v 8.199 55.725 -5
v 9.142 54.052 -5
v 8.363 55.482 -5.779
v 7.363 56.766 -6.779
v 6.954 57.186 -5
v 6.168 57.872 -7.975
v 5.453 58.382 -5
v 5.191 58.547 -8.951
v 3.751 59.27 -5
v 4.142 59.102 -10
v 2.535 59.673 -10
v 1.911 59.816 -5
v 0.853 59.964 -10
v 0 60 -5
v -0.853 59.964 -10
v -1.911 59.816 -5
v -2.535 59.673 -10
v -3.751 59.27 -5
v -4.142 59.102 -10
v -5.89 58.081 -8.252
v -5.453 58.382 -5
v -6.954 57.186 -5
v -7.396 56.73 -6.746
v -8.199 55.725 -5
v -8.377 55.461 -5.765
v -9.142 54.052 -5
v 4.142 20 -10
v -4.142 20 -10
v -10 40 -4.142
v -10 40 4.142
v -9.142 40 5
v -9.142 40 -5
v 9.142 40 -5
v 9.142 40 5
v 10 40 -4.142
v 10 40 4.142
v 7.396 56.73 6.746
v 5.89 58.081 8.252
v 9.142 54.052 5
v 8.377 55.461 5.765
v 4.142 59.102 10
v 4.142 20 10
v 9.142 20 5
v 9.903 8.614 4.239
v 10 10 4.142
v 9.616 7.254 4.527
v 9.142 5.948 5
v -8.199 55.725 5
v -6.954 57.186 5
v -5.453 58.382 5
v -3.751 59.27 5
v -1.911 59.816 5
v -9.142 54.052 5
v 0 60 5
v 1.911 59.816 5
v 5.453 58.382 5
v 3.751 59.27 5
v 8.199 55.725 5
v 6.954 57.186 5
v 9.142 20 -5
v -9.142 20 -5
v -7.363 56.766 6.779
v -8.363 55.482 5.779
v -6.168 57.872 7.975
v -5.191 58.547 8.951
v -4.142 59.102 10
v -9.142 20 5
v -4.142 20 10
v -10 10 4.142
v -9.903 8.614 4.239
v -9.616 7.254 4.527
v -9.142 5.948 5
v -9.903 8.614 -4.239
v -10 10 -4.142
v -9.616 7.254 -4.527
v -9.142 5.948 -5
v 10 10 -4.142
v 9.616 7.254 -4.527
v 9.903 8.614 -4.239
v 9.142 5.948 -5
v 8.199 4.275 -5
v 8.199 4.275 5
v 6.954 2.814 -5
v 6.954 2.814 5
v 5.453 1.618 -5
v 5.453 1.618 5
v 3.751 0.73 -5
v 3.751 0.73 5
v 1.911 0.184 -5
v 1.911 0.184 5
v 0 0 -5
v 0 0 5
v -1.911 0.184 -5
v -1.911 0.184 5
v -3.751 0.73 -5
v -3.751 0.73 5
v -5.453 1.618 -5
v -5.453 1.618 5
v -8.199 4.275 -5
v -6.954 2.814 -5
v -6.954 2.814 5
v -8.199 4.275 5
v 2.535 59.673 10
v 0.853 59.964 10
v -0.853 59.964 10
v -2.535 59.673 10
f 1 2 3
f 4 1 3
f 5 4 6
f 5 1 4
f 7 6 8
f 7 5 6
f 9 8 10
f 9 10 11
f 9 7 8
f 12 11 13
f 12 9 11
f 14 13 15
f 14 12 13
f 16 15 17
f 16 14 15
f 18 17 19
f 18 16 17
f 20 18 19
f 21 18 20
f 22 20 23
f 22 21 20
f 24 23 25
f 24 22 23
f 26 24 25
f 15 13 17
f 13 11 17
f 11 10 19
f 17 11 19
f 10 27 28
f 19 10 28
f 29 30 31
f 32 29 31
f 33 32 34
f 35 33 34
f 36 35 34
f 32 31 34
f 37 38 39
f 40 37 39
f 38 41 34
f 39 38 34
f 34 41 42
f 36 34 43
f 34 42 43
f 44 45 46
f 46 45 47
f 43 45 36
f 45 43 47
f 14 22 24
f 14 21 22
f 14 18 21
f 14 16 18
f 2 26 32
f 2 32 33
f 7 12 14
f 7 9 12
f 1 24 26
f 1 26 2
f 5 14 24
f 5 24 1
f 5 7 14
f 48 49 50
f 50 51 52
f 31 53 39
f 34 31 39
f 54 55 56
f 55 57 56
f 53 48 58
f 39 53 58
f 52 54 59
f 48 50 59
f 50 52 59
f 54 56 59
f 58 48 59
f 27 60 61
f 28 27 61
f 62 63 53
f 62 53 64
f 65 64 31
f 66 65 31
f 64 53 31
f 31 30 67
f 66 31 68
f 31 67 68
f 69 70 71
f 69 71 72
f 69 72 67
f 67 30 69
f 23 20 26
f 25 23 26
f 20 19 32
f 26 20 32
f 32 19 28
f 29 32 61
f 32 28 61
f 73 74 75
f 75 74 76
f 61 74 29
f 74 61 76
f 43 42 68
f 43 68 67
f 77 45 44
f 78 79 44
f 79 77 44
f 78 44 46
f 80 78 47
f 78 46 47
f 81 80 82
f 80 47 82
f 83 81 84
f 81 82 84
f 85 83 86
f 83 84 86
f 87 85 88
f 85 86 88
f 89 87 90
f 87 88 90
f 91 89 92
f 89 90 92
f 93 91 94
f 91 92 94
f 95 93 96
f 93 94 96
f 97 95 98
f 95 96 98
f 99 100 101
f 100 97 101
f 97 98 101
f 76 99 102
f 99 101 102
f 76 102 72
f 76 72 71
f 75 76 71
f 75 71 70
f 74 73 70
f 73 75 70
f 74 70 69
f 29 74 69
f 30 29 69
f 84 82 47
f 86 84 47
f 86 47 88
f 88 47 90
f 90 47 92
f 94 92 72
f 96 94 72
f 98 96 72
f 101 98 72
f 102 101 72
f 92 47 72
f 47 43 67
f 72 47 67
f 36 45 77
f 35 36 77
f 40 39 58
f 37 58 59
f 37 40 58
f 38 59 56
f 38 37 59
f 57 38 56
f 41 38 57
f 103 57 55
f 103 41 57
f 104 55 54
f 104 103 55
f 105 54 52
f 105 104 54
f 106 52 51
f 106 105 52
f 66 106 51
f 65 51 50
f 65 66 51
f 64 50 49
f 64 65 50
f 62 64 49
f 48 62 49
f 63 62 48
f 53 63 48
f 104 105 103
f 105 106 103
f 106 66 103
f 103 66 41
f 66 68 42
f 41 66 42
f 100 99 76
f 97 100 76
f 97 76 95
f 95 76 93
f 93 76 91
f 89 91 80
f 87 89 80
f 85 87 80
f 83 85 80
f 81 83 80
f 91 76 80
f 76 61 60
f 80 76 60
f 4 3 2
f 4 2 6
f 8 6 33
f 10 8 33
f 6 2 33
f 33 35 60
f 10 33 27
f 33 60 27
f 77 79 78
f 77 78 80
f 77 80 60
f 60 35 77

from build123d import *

# Parameters (mm, degrees)
EXTRUDE_1_DEPTH     = 60
CUT_EXTRUDE_1_DEPTH = 66
CUT_EXTRUDE_2_DEPTH = 5
CUT_EXTRUDE_START   = -5
CUT_EXTRUDE_3_DEPTH = 5
SKETCH_6_W          = 20
SKETCH_6_H          = 20
CUT_EXTRUDE_4_DEPTH = 5
CUT_EXTRUDE_5_DEPTH = 30


with BuildPart() as part:
    # 草图1 → 凸台-拉伸1 (new body)
    with BuildSketch(Plane(origin=(0, 0, 0), x_dir=(1, 0, 0), z_dir=(0, 1, 0))):
        Polygon((10, 4.142135624), (4.142135624, 10), (-4.142135624, 10), (-10, 4.142135624), (-10, -4.142135624), (-4.142135624, -10), (4.142135624, -10), (10, -4.142135624), align=None)
    extrude(amount=EXTRUDE_1_DEPTH)

    # 草图2 → 切除-拉伸1 (cut)
    with BuildSketch(Plane.XY.offset(10)):
        with BuildLine():
            Line((-10, 10), (-10, -2.389295552))
            Line((-10, -2.389295552), (10, -2.389295552))
            Line((10, -2.389295552), (10, 10))
            ThreePointArc((10, 10), (0, 0), (-10, 10))
        make_face()
    extrude(amount=-CUT_EXTRUDE_1_DEPTH, mode=Mode.SUBTRACT)

    # 草图4 → 切除-拉伸2 (cut)
    with BuildSketch(Plane.XY.offset(10)):
        with BuildLine():
            Line((-10, 10), (-10, 20))
            Line((-10, 20), (10, 20))
            Line((10, 20), (10, 10))
            ThreePointArc((10, 10), (0, 0), (-10, 10))
        make_face()
    extrude(amount=-CUT_EXTRUDE_2_DEPTH, mode=Mode.SUBTRACT)

    # 草图5 → 切除-拉伸3 (cut)
    with BuildSketch(Plane(origin=(0, 0, -10), x_dir=(-1, 0, 0), z_dir=(0, 0, -1)).offset(CUT_EXTRUDE_START)):
        with BuildLine():
            Line((-10, 10), (-10, 20))
            Line((-10, 20), (10, 20))
            Line((10, 20), (10, 10))
            ThreePointArc((10, 10), (0, 0), (-10, 10))
        make_face()
    extrude(amount=CUT_EXTRUDE_3_DEPTH, mode=Mode.SUBTRACT)

    # 草图6 → 切除-拉伸4 (cut, symmetric)
    with BuildSketch(Plane.XY):
        with Locations((0, 50)):
            Rectangle(SKETCH_6_W, SKETCH_6_H)
    extrude(amount=CUT_EXTRUDE_4_DEPTH, both=True, mode=Mode.SUBTRACT)

    # 草图7 → 切除-拉伸5 (cut)
    with BuildSketch(Plane.XY.offset(10)):
        with BuildLine():
            Line((-10, 50), (-10, 63.661192365))
            Line((-10, 63.661192365), (10, 63.661192365))
            Line((10, 63.661192365), (10, 50))
            ThreePointArc((10, 50), (0, 60), (-10, 50))
        make_face()
    extrude(amount=-CUT_EXTRUDE_5_DEPTH, mode=Mode.SUBTRACT)


solid = part.part
